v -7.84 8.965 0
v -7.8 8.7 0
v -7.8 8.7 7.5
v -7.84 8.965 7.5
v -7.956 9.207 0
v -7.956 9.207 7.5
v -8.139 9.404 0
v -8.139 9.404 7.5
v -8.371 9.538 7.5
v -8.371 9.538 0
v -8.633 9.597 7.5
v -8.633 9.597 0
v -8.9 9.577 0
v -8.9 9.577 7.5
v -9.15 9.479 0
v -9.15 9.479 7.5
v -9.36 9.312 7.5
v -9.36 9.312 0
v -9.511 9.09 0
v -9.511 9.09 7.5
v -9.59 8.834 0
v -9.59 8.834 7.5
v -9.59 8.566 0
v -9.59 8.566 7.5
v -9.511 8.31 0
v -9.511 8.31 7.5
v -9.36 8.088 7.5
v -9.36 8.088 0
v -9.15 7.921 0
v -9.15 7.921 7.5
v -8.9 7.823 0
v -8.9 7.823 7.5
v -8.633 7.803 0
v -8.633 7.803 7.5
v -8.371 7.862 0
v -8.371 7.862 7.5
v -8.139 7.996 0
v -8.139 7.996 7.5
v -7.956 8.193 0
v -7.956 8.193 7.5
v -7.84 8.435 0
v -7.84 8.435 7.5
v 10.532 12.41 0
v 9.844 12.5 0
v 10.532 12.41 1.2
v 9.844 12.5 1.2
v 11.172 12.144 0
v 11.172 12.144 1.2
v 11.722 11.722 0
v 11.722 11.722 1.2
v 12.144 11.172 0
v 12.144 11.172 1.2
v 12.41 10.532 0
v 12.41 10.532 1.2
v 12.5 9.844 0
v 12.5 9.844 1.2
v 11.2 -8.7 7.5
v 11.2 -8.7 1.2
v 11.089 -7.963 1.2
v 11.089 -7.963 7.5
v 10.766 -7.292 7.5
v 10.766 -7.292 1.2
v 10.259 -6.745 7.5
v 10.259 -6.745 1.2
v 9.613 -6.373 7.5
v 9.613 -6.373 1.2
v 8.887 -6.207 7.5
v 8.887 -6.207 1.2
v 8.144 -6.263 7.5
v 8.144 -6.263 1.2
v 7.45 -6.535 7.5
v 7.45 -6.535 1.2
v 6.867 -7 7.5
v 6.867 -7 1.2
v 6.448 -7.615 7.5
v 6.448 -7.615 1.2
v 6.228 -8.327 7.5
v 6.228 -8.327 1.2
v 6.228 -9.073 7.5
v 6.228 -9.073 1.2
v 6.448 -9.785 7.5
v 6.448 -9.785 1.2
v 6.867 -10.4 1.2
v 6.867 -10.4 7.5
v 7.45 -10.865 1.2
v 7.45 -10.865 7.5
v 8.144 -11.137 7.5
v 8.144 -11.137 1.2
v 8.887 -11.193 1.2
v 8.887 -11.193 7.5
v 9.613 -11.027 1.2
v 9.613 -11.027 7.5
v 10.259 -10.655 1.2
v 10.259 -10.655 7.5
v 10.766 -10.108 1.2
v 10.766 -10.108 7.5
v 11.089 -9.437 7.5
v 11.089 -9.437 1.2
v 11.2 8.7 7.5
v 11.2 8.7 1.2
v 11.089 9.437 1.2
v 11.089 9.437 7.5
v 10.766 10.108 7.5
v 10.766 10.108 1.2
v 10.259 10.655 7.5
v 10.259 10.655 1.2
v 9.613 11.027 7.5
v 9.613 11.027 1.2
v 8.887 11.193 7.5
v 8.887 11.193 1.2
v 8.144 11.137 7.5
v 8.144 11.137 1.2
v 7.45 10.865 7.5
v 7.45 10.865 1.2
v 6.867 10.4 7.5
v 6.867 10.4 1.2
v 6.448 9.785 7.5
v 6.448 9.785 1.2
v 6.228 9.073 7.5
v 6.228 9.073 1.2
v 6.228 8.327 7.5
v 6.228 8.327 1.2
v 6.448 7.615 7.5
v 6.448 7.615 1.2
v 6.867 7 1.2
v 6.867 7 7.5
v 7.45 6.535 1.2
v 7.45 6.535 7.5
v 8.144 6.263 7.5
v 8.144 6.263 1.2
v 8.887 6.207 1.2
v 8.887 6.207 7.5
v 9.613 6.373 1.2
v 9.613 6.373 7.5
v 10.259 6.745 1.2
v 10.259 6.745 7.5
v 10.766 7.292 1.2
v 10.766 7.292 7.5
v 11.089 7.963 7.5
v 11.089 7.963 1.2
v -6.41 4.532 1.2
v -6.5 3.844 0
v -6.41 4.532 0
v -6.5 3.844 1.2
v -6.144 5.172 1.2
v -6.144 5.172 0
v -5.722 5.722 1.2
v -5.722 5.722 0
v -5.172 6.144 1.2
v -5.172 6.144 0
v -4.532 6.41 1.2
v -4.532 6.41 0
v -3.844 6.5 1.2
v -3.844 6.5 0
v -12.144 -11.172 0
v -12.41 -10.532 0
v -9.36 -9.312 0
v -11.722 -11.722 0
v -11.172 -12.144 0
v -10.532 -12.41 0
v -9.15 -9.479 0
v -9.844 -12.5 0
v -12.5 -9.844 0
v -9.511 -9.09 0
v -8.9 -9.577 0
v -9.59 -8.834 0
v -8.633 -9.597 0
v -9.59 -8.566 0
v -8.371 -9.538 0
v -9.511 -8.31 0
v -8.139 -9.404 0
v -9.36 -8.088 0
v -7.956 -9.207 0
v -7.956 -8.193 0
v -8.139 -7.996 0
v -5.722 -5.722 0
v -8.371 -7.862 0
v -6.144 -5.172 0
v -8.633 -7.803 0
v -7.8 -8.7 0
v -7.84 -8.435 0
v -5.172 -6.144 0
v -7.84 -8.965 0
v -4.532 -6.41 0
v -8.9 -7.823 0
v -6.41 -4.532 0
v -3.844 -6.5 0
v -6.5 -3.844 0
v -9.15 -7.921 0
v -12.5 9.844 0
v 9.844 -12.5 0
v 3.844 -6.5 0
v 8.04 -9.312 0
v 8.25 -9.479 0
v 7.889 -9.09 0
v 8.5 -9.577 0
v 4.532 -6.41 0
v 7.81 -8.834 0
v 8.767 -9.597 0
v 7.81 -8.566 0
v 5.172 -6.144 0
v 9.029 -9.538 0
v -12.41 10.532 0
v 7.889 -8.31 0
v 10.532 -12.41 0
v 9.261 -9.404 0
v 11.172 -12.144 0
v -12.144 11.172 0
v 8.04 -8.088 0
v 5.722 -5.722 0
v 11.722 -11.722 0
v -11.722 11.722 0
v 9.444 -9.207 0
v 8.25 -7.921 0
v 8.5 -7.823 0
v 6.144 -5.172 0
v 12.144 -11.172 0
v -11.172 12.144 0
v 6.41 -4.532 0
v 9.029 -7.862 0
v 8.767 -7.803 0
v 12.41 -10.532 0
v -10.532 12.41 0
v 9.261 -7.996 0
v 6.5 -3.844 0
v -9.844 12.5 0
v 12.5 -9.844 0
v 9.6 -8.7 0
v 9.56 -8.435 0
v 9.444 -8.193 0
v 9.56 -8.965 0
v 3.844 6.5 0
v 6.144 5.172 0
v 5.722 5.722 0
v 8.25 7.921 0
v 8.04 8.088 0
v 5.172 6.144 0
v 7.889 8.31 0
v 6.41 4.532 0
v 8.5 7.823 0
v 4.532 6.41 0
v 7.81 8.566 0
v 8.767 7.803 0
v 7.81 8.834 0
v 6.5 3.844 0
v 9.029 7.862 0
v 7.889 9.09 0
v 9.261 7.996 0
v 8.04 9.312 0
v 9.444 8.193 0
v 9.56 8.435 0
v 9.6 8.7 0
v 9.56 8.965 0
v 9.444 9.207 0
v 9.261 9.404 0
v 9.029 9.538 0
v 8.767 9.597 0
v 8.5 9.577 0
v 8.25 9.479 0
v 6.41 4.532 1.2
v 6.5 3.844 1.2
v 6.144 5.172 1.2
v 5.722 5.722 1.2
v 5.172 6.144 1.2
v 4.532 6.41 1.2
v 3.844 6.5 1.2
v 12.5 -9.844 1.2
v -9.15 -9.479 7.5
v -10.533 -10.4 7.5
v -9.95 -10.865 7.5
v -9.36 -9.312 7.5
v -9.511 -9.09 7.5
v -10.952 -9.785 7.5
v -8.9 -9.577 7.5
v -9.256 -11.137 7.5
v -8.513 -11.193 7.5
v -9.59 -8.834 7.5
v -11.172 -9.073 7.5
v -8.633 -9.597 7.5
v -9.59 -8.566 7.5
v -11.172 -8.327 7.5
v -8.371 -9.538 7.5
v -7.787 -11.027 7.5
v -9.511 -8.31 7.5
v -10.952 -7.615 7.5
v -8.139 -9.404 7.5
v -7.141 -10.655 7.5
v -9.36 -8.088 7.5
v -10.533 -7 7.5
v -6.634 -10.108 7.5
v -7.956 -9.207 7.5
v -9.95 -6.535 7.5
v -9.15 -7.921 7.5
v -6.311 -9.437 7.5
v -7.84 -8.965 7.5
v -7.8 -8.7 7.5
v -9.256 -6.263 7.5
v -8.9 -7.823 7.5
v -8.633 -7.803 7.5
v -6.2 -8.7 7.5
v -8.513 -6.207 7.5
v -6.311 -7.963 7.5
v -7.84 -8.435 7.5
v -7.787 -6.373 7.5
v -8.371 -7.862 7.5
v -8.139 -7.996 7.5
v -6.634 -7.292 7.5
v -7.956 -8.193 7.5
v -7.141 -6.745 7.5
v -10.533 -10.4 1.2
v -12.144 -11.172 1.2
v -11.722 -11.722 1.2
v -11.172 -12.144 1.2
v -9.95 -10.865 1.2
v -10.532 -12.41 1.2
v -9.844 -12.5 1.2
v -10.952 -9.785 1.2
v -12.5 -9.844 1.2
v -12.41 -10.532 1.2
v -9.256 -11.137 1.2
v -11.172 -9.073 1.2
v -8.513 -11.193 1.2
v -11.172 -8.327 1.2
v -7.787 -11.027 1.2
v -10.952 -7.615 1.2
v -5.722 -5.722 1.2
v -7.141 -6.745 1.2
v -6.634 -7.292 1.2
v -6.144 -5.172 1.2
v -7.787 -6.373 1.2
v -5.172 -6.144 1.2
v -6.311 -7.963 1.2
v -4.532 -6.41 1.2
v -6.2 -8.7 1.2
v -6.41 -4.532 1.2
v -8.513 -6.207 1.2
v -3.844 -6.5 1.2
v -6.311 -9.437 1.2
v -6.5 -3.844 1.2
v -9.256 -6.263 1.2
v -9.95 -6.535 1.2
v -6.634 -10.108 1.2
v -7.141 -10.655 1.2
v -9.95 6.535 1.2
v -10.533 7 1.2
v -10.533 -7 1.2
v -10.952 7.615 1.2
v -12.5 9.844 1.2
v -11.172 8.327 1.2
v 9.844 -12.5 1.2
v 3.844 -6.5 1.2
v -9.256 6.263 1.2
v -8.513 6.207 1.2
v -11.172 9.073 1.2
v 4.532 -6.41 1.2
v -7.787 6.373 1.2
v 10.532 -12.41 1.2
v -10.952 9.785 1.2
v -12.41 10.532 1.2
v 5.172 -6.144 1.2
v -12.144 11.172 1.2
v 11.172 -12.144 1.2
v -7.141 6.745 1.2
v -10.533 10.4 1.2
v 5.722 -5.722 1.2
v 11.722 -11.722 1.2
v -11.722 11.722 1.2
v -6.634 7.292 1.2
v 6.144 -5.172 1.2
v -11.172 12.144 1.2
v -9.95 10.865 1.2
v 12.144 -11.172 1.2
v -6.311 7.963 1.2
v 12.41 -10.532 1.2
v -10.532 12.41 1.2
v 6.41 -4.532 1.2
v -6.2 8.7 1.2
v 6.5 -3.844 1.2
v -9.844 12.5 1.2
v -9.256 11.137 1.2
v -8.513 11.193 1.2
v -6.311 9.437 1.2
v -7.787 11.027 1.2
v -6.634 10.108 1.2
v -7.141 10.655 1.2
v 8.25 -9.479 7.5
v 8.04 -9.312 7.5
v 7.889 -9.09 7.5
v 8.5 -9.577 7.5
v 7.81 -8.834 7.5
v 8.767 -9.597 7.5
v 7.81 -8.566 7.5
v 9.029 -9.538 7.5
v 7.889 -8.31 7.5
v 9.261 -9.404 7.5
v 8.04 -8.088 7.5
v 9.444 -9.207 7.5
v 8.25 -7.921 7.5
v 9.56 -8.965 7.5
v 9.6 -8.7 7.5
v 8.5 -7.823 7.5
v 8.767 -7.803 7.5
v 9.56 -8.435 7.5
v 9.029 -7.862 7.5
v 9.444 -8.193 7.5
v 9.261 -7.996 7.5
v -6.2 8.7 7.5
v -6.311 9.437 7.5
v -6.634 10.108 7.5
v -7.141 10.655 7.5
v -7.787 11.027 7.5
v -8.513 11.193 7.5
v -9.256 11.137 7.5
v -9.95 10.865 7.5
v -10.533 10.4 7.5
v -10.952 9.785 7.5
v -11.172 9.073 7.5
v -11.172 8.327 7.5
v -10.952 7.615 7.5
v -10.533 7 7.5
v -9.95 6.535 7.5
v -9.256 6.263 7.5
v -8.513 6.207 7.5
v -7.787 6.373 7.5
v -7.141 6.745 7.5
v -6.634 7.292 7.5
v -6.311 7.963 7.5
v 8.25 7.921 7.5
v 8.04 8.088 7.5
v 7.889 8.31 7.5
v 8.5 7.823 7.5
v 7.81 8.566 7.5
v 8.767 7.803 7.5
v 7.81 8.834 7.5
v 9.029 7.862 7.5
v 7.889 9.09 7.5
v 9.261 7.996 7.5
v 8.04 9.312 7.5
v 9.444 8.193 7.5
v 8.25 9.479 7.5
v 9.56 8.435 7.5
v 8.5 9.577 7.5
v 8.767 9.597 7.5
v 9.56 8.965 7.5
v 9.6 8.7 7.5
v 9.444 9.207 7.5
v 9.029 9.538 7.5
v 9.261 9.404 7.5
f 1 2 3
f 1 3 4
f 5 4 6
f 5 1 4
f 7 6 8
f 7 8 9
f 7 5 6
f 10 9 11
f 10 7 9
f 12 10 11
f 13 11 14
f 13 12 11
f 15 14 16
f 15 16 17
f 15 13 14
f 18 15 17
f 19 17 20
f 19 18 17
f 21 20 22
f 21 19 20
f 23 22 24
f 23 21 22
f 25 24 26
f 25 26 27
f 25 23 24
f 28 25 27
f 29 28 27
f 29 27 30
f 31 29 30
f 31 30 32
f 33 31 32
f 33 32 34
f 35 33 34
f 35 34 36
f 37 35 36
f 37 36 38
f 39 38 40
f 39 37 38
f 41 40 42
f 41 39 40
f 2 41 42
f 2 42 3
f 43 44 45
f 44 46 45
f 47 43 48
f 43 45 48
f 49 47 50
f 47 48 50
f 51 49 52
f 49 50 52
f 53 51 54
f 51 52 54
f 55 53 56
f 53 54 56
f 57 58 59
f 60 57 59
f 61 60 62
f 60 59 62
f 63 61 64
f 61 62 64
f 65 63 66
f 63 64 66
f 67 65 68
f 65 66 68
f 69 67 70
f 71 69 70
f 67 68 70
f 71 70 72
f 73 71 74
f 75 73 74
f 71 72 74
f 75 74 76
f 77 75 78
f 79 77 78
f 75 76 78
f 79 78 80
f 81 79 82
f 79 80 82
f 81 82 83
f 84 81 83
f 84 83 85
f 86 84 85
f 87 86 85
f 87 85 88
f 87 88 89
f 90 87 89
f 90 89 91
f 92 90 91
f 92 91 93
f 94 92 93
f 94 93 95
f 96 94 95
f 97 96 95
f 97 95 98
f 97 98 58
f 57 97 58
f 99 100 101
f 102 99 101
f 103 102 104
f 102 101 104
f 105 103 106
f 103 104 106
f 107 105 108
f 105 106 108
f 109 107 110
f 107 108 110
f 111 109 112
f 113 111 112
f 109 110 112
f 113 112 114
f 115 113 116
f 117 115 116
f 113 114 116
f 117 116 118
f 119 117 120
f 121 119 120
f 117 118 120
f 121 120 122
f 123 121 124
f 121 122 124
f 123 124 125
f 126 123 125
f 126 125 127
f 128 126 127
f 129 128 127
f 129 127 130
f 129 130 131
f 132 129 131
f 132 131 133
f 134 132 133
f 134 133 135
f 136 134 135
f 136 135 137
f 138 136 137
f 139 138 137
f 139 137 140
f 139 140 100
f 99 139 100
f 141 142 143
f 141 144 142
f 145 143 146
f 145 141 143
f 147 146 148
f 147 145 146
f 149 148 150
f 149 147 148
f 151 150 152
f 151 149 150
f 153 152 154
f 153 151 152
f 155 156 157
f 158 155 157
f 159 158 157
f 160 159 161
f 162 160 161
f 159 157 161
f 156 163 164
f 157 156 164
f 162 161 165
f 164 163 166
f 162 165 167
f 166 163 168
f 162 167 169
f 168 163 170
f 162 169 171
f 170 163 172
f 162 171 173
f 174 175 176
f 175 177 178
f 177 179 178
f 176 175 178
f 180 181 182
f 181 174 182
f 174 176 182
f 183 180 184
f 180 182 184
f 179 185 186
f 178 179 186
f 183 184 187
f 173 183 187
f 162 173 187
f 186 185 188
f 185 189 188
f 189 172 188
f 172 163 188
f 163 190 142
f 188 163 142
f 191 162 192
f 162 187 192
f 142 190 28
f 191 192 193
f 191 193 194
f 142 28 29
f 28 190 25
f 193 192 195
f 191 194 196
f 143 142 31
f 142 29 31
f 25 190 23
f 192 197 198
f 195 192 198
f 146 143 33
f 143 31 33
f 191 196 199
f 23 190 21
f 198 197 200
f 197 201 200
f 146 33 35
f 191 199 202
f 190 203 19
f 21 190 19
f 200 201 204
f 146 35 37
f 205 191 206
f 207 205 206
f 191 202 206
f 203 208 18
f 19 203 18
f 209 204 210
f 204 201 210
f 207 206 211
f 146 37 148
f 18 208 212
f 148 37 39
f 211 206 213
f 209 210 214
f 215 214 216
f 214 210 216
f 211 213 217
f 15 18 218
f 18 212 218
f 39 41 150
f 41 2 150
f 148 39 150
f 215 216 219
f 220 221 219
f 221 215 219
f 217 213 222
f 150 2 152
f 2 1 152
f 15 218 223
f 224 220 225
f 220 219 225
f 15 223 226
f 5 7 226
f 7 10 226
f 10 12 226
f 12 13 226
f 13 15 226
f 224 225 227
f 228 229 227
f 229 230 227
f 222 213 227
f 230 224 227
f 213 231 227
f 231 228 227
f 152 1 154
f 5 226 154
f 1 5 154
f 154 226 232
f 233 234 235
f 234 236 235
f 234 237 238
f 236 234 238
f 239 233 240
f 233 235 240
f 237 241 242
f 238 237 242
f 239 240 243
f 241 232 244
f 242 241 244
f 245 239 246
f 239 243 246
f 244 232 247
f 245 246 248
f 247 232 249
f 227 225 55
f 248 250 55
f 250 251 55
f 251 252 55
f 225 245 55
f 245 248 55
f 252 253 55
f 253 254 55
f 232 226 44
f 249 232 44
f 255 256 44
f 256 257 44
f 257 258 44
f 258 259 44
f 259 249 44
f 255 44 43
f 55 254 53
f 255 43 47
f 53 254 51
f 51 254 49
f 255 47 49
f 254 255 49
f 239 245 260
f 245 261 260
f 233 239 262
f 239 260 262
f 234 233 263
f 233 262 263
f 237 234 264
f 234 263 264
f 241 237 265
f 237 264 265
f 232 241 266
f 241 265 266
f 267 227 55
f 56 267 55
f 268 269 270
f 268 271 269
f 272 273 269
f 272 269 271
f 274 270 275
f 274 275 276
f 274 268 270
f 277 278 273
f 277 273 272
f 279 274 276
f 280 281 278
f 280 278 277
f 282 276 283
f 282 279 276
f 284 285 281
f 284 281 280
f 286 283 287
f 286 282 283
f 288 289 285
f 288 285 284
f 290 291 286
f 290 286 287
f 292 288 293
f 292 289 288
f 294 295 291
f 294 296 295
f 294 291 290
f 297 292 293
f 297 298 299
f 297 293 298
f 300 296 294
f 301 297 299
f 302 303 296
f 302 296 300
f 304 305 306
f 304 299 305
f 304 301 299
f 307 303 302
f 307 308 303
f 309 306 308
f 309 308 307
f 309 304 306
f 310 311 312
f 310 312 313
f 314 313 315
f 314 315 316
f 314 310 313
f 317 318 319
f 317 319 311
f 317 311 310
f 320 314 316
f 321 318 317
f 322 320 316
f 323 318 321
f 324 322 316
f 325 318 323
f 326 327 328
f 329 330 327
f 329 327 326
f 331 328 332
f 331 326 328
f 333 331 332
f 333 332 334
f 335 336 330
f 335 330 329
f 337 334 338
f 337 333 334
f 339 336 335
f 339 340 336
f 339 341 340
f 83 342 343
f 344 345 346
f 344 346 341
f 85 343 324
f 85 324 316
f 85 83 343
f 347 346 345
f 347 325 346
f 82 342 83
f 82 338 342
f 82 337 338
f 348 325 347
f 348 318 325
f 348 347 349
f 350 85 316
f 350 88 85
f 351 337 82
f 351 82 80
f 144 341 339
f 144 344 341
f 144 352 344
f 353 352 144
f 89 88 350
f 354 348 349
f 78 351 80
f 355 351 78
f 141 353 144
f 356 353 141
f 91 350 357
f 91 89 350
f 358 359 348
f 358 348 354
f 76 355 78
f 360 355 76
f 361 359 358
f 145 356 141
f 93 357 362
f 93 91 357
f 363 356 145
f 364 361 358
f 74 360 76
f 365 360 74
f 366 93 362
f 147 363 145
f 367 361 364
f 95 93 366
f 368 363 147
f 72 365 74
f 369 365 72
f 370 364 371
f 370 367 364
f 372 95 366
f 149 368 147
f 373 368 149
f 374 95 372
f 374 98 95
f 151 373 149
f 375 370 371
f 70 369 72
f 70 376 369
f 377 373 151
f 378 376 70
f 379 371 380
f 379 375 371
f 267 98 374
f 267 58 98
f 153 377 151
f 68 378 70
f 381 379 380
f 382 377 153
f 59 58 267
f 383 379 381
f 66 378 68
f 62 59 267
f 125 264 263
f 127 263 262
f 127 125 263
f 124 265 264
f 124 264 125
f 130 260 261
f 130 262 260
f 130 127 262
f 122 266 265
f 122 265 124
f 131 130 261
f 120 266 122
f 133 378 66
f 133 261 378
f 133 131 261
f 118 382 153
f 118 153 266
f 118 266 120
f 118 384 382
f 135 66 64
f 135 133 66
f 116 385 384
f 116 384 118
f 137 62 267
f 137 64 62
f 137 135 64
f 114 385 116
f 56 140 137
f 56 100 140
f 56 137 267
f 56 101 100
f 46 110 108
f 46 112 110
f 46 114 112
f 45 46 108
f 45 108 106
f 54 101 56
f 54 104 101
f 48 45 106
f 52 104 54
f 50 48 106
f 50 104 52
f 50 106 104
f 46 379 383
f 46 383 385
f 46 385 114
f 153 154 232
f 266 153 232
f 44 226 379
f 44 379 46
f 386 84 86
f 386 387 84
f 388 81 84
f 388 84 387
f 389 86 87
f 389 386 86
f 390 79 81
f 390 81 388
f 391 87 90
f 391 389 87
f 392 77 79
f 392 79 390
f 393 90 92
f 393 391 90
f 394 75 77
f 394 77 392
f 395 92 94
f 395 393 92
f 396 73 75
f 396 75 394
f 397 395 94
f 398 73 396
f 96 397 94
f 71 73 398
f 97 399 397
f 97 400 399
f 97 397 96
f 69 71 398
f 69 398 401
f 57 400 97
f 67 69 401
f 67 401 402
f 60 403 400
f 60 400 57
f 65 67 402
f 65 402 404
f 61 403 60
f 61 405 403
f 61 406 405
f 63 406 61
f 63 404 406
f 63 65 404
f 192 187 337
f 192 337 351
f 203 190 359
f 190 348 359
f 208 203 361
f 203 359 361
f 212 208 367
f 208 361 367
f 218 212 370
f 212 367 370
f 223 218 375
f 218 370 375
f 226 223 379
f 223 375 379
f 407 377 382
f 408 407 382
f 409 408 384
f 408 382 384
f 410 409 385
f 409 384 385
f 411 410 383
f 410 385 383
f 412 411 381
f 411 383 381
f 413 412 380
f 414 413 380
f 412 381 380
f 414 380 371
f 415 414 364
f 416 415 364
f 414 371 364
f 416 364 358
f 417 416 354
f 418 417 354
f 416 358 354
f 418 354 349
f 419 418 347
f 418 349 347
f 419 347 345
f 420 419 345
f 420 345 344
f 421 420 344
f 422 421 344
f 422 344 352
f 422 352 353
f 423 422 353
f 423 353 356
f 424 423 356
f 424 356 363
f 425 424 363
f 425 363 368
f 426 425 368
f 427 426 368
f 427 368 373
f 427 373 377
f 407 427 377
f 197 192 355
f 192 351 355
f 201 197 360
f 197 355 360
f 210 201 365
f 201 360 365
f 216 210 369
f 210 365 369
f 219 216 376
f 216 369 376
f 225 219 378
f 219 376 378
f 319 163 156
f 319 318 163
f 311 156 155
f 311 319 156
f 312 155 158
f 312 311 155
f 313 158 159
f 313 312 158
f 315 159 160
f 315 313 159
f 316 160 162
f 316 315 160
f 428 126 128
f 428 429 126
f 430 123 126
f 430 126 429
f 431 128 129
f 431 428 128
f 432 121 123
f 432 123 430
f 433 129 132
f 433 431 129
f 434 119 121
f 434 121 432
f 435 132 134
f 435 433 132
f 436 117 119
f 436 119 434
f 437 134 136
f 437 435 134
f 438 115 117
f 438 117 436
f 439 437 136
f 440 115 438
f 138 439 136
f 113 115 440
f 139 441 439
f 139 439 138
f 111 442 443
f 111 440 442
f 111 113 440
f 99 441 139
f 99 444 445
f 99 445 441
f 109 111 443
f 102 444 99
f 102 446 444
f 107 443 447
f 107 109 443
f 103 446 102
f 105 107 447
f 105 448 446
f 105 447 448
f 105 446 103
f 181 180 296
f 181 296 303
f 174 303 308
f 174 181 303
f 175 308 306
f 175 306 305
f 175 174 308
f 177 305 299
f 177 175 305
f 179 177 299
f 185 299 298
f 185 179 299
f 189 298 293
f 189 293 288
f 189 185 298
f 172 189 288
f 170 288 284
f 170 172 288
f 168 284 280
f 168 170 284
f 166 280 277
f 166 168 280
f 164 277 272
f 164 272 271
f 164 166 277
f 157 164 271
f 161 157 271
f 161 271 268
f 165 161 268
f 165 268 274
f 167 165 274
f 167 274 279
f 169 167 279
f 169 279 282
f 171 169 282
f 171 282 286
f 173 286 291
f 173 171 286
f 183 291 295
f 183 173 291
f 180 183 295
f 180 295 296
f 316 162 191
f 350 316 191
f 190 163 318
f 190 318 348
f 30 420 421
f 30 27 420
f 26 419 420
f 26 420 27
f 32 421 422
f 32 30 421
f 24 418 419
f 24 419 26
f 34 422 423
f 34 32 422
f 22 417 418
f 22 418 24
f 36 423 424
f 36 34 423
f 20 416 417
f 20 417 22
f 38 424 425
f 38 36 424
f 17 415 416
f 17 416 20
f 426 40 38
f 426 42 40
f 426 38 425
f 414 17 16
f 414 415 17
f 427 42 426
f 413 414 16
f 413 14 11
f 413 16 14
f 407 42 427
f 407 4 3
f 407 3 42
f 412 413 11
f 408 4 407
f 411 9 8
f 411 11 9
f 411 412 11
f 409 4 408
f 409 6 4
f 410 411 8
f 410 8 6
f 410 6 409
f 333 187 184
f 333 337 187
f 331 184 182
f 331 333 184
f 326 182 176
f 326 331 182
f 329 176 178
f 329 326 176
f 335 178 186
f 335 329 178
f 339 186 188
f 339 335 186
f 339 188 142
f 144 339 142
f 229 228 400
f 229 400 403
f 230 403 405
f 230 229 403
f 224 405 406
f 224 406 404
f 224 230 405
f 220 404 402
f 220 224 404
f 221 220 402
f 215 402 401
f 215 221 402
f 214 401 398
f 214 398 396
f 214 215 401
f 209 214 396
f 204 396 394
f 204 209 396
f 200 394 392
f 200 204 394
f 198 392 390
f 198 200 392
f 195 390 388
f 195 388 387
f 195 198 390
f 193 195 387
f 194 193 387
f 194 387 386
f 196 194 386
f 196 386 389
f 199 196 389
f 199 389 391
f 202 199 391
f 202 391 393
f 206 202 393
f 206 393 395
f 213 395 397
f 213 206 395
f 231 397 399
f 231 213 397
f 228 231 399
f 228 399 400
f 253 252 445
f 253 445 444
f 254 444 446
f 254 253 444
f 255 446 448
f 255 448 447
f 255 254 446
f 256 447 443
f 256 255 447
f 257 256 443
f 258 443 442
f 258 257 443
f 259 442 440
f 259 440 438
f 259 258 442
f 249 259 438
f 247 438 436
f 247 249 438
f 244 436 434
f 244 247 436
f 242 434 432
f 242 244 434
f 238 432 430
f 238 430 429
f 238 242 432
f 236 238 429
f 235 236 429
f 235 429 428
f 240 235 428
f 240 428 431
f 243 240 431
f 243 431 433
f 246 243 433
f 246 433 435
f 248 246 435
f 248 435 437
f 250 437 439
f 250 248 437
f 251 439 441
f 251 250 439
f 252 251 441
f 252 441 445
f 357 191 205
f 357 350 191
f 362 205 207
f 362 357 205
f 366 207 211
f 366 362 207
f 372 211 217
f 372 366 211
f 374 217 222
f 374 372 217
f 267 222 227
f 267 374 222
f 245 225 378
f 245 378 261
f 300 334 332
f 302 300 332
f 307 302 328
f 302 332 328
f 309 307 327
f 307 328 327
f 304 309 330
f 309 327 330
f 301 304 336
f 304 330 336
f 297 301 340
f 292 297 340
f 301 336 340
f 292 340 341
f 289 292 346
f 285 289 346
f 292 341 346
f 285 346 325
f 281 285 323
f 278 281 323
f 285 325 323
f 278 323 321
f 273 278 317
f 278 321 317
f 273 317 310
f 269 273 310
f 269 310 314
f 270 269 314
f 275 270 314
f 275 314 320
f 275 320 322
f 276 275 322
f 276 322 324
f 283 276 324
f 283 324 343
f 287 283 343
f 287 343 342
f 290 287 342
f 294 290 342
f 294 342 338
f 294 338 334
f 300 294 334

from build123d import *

# Parameters (mm, degrees)
F0_W     = 25
F0_H     = 25
F0_R     = 2.5
F0_W_2   = 13
F0_H_2   = 13
F1_DEPTH = 1.2
F0_R_2   = 0.9
F2_DEPTH = 7.5
F3_R     = 2.655635


with BuildPart() as f1:
    # F0 (on Top) → F1 (new body)
    with BuildSketch(Plane.XY):
        Rectangle(F0_W, F0_H)
        with Locations((-8.7, -8.7)):
            Circle(F0_R, mode=Mode.SUBTRACT)
        with Locations((8.7, -8.7)):
            Circle(F0_R, mode=Mode.SUBTRACT)
        with Locations((-8.7, 8.7)):
            Circle(F0_R, mode=Mode.SUBTRACT)
        Rectangle(F0_W_2, F0_H_2, mode=Mode.SUBTRACT)
        with Locations((8.7, 8.7)):
            Circle(F0_R, mode=Mode.SUBTRACT)
    extrude(amount=F1_DEPTH)

    # F0 (on Top) → F2 (join)
    with BuildSketch(Plane.XY):
        with Locations((-8.7, 8.7)):
            Circle(F0_R)
        with Locations((-8.7, 8.7)):
            Circle(F0_R_2, mode=Mode.SUBTRACT)
        with Locations((8.7, 8.7)):
            Circle(F0_R)
        with Locations((8.7, 8.7)):
            Circle(F0_R_2, mode=Mode.SUBTRACT)
        with Locations((-8.7, -8.7)):
            Circle(F0_R)
        with Locations((-8.7, -8.7)):
            Circle(F0_R_2, mode=Mode.SUBTRACT)
        with Locations((8.7, -8.7)):
            Circle(F0_R)
        with Locations((8.7, -8.7)):
            Circle(F0_R_2, mode=Mode.SUBTRACT)
    extrude(amount=F2_DEPTH)

    # F3
    f3_edges = [f1.edges().sort_by_distance(p)[0] for p in [
        (12.5, -12.5, 0.6),
        (12.5, 12.5, 0.6),
        (-12.5, 12.5, 0.6),
        (-12.5, -12.5, 0.6),
        (-6.5, 6.5, 0.6),
        (-6.5, -6.5, 0.6),
        (6.5, -6.5, 0.6),
        (6.5, 6.5, 0.6),
    ]]
    fillet(f3_edges, radius=F3_R)


solid = f1.part
